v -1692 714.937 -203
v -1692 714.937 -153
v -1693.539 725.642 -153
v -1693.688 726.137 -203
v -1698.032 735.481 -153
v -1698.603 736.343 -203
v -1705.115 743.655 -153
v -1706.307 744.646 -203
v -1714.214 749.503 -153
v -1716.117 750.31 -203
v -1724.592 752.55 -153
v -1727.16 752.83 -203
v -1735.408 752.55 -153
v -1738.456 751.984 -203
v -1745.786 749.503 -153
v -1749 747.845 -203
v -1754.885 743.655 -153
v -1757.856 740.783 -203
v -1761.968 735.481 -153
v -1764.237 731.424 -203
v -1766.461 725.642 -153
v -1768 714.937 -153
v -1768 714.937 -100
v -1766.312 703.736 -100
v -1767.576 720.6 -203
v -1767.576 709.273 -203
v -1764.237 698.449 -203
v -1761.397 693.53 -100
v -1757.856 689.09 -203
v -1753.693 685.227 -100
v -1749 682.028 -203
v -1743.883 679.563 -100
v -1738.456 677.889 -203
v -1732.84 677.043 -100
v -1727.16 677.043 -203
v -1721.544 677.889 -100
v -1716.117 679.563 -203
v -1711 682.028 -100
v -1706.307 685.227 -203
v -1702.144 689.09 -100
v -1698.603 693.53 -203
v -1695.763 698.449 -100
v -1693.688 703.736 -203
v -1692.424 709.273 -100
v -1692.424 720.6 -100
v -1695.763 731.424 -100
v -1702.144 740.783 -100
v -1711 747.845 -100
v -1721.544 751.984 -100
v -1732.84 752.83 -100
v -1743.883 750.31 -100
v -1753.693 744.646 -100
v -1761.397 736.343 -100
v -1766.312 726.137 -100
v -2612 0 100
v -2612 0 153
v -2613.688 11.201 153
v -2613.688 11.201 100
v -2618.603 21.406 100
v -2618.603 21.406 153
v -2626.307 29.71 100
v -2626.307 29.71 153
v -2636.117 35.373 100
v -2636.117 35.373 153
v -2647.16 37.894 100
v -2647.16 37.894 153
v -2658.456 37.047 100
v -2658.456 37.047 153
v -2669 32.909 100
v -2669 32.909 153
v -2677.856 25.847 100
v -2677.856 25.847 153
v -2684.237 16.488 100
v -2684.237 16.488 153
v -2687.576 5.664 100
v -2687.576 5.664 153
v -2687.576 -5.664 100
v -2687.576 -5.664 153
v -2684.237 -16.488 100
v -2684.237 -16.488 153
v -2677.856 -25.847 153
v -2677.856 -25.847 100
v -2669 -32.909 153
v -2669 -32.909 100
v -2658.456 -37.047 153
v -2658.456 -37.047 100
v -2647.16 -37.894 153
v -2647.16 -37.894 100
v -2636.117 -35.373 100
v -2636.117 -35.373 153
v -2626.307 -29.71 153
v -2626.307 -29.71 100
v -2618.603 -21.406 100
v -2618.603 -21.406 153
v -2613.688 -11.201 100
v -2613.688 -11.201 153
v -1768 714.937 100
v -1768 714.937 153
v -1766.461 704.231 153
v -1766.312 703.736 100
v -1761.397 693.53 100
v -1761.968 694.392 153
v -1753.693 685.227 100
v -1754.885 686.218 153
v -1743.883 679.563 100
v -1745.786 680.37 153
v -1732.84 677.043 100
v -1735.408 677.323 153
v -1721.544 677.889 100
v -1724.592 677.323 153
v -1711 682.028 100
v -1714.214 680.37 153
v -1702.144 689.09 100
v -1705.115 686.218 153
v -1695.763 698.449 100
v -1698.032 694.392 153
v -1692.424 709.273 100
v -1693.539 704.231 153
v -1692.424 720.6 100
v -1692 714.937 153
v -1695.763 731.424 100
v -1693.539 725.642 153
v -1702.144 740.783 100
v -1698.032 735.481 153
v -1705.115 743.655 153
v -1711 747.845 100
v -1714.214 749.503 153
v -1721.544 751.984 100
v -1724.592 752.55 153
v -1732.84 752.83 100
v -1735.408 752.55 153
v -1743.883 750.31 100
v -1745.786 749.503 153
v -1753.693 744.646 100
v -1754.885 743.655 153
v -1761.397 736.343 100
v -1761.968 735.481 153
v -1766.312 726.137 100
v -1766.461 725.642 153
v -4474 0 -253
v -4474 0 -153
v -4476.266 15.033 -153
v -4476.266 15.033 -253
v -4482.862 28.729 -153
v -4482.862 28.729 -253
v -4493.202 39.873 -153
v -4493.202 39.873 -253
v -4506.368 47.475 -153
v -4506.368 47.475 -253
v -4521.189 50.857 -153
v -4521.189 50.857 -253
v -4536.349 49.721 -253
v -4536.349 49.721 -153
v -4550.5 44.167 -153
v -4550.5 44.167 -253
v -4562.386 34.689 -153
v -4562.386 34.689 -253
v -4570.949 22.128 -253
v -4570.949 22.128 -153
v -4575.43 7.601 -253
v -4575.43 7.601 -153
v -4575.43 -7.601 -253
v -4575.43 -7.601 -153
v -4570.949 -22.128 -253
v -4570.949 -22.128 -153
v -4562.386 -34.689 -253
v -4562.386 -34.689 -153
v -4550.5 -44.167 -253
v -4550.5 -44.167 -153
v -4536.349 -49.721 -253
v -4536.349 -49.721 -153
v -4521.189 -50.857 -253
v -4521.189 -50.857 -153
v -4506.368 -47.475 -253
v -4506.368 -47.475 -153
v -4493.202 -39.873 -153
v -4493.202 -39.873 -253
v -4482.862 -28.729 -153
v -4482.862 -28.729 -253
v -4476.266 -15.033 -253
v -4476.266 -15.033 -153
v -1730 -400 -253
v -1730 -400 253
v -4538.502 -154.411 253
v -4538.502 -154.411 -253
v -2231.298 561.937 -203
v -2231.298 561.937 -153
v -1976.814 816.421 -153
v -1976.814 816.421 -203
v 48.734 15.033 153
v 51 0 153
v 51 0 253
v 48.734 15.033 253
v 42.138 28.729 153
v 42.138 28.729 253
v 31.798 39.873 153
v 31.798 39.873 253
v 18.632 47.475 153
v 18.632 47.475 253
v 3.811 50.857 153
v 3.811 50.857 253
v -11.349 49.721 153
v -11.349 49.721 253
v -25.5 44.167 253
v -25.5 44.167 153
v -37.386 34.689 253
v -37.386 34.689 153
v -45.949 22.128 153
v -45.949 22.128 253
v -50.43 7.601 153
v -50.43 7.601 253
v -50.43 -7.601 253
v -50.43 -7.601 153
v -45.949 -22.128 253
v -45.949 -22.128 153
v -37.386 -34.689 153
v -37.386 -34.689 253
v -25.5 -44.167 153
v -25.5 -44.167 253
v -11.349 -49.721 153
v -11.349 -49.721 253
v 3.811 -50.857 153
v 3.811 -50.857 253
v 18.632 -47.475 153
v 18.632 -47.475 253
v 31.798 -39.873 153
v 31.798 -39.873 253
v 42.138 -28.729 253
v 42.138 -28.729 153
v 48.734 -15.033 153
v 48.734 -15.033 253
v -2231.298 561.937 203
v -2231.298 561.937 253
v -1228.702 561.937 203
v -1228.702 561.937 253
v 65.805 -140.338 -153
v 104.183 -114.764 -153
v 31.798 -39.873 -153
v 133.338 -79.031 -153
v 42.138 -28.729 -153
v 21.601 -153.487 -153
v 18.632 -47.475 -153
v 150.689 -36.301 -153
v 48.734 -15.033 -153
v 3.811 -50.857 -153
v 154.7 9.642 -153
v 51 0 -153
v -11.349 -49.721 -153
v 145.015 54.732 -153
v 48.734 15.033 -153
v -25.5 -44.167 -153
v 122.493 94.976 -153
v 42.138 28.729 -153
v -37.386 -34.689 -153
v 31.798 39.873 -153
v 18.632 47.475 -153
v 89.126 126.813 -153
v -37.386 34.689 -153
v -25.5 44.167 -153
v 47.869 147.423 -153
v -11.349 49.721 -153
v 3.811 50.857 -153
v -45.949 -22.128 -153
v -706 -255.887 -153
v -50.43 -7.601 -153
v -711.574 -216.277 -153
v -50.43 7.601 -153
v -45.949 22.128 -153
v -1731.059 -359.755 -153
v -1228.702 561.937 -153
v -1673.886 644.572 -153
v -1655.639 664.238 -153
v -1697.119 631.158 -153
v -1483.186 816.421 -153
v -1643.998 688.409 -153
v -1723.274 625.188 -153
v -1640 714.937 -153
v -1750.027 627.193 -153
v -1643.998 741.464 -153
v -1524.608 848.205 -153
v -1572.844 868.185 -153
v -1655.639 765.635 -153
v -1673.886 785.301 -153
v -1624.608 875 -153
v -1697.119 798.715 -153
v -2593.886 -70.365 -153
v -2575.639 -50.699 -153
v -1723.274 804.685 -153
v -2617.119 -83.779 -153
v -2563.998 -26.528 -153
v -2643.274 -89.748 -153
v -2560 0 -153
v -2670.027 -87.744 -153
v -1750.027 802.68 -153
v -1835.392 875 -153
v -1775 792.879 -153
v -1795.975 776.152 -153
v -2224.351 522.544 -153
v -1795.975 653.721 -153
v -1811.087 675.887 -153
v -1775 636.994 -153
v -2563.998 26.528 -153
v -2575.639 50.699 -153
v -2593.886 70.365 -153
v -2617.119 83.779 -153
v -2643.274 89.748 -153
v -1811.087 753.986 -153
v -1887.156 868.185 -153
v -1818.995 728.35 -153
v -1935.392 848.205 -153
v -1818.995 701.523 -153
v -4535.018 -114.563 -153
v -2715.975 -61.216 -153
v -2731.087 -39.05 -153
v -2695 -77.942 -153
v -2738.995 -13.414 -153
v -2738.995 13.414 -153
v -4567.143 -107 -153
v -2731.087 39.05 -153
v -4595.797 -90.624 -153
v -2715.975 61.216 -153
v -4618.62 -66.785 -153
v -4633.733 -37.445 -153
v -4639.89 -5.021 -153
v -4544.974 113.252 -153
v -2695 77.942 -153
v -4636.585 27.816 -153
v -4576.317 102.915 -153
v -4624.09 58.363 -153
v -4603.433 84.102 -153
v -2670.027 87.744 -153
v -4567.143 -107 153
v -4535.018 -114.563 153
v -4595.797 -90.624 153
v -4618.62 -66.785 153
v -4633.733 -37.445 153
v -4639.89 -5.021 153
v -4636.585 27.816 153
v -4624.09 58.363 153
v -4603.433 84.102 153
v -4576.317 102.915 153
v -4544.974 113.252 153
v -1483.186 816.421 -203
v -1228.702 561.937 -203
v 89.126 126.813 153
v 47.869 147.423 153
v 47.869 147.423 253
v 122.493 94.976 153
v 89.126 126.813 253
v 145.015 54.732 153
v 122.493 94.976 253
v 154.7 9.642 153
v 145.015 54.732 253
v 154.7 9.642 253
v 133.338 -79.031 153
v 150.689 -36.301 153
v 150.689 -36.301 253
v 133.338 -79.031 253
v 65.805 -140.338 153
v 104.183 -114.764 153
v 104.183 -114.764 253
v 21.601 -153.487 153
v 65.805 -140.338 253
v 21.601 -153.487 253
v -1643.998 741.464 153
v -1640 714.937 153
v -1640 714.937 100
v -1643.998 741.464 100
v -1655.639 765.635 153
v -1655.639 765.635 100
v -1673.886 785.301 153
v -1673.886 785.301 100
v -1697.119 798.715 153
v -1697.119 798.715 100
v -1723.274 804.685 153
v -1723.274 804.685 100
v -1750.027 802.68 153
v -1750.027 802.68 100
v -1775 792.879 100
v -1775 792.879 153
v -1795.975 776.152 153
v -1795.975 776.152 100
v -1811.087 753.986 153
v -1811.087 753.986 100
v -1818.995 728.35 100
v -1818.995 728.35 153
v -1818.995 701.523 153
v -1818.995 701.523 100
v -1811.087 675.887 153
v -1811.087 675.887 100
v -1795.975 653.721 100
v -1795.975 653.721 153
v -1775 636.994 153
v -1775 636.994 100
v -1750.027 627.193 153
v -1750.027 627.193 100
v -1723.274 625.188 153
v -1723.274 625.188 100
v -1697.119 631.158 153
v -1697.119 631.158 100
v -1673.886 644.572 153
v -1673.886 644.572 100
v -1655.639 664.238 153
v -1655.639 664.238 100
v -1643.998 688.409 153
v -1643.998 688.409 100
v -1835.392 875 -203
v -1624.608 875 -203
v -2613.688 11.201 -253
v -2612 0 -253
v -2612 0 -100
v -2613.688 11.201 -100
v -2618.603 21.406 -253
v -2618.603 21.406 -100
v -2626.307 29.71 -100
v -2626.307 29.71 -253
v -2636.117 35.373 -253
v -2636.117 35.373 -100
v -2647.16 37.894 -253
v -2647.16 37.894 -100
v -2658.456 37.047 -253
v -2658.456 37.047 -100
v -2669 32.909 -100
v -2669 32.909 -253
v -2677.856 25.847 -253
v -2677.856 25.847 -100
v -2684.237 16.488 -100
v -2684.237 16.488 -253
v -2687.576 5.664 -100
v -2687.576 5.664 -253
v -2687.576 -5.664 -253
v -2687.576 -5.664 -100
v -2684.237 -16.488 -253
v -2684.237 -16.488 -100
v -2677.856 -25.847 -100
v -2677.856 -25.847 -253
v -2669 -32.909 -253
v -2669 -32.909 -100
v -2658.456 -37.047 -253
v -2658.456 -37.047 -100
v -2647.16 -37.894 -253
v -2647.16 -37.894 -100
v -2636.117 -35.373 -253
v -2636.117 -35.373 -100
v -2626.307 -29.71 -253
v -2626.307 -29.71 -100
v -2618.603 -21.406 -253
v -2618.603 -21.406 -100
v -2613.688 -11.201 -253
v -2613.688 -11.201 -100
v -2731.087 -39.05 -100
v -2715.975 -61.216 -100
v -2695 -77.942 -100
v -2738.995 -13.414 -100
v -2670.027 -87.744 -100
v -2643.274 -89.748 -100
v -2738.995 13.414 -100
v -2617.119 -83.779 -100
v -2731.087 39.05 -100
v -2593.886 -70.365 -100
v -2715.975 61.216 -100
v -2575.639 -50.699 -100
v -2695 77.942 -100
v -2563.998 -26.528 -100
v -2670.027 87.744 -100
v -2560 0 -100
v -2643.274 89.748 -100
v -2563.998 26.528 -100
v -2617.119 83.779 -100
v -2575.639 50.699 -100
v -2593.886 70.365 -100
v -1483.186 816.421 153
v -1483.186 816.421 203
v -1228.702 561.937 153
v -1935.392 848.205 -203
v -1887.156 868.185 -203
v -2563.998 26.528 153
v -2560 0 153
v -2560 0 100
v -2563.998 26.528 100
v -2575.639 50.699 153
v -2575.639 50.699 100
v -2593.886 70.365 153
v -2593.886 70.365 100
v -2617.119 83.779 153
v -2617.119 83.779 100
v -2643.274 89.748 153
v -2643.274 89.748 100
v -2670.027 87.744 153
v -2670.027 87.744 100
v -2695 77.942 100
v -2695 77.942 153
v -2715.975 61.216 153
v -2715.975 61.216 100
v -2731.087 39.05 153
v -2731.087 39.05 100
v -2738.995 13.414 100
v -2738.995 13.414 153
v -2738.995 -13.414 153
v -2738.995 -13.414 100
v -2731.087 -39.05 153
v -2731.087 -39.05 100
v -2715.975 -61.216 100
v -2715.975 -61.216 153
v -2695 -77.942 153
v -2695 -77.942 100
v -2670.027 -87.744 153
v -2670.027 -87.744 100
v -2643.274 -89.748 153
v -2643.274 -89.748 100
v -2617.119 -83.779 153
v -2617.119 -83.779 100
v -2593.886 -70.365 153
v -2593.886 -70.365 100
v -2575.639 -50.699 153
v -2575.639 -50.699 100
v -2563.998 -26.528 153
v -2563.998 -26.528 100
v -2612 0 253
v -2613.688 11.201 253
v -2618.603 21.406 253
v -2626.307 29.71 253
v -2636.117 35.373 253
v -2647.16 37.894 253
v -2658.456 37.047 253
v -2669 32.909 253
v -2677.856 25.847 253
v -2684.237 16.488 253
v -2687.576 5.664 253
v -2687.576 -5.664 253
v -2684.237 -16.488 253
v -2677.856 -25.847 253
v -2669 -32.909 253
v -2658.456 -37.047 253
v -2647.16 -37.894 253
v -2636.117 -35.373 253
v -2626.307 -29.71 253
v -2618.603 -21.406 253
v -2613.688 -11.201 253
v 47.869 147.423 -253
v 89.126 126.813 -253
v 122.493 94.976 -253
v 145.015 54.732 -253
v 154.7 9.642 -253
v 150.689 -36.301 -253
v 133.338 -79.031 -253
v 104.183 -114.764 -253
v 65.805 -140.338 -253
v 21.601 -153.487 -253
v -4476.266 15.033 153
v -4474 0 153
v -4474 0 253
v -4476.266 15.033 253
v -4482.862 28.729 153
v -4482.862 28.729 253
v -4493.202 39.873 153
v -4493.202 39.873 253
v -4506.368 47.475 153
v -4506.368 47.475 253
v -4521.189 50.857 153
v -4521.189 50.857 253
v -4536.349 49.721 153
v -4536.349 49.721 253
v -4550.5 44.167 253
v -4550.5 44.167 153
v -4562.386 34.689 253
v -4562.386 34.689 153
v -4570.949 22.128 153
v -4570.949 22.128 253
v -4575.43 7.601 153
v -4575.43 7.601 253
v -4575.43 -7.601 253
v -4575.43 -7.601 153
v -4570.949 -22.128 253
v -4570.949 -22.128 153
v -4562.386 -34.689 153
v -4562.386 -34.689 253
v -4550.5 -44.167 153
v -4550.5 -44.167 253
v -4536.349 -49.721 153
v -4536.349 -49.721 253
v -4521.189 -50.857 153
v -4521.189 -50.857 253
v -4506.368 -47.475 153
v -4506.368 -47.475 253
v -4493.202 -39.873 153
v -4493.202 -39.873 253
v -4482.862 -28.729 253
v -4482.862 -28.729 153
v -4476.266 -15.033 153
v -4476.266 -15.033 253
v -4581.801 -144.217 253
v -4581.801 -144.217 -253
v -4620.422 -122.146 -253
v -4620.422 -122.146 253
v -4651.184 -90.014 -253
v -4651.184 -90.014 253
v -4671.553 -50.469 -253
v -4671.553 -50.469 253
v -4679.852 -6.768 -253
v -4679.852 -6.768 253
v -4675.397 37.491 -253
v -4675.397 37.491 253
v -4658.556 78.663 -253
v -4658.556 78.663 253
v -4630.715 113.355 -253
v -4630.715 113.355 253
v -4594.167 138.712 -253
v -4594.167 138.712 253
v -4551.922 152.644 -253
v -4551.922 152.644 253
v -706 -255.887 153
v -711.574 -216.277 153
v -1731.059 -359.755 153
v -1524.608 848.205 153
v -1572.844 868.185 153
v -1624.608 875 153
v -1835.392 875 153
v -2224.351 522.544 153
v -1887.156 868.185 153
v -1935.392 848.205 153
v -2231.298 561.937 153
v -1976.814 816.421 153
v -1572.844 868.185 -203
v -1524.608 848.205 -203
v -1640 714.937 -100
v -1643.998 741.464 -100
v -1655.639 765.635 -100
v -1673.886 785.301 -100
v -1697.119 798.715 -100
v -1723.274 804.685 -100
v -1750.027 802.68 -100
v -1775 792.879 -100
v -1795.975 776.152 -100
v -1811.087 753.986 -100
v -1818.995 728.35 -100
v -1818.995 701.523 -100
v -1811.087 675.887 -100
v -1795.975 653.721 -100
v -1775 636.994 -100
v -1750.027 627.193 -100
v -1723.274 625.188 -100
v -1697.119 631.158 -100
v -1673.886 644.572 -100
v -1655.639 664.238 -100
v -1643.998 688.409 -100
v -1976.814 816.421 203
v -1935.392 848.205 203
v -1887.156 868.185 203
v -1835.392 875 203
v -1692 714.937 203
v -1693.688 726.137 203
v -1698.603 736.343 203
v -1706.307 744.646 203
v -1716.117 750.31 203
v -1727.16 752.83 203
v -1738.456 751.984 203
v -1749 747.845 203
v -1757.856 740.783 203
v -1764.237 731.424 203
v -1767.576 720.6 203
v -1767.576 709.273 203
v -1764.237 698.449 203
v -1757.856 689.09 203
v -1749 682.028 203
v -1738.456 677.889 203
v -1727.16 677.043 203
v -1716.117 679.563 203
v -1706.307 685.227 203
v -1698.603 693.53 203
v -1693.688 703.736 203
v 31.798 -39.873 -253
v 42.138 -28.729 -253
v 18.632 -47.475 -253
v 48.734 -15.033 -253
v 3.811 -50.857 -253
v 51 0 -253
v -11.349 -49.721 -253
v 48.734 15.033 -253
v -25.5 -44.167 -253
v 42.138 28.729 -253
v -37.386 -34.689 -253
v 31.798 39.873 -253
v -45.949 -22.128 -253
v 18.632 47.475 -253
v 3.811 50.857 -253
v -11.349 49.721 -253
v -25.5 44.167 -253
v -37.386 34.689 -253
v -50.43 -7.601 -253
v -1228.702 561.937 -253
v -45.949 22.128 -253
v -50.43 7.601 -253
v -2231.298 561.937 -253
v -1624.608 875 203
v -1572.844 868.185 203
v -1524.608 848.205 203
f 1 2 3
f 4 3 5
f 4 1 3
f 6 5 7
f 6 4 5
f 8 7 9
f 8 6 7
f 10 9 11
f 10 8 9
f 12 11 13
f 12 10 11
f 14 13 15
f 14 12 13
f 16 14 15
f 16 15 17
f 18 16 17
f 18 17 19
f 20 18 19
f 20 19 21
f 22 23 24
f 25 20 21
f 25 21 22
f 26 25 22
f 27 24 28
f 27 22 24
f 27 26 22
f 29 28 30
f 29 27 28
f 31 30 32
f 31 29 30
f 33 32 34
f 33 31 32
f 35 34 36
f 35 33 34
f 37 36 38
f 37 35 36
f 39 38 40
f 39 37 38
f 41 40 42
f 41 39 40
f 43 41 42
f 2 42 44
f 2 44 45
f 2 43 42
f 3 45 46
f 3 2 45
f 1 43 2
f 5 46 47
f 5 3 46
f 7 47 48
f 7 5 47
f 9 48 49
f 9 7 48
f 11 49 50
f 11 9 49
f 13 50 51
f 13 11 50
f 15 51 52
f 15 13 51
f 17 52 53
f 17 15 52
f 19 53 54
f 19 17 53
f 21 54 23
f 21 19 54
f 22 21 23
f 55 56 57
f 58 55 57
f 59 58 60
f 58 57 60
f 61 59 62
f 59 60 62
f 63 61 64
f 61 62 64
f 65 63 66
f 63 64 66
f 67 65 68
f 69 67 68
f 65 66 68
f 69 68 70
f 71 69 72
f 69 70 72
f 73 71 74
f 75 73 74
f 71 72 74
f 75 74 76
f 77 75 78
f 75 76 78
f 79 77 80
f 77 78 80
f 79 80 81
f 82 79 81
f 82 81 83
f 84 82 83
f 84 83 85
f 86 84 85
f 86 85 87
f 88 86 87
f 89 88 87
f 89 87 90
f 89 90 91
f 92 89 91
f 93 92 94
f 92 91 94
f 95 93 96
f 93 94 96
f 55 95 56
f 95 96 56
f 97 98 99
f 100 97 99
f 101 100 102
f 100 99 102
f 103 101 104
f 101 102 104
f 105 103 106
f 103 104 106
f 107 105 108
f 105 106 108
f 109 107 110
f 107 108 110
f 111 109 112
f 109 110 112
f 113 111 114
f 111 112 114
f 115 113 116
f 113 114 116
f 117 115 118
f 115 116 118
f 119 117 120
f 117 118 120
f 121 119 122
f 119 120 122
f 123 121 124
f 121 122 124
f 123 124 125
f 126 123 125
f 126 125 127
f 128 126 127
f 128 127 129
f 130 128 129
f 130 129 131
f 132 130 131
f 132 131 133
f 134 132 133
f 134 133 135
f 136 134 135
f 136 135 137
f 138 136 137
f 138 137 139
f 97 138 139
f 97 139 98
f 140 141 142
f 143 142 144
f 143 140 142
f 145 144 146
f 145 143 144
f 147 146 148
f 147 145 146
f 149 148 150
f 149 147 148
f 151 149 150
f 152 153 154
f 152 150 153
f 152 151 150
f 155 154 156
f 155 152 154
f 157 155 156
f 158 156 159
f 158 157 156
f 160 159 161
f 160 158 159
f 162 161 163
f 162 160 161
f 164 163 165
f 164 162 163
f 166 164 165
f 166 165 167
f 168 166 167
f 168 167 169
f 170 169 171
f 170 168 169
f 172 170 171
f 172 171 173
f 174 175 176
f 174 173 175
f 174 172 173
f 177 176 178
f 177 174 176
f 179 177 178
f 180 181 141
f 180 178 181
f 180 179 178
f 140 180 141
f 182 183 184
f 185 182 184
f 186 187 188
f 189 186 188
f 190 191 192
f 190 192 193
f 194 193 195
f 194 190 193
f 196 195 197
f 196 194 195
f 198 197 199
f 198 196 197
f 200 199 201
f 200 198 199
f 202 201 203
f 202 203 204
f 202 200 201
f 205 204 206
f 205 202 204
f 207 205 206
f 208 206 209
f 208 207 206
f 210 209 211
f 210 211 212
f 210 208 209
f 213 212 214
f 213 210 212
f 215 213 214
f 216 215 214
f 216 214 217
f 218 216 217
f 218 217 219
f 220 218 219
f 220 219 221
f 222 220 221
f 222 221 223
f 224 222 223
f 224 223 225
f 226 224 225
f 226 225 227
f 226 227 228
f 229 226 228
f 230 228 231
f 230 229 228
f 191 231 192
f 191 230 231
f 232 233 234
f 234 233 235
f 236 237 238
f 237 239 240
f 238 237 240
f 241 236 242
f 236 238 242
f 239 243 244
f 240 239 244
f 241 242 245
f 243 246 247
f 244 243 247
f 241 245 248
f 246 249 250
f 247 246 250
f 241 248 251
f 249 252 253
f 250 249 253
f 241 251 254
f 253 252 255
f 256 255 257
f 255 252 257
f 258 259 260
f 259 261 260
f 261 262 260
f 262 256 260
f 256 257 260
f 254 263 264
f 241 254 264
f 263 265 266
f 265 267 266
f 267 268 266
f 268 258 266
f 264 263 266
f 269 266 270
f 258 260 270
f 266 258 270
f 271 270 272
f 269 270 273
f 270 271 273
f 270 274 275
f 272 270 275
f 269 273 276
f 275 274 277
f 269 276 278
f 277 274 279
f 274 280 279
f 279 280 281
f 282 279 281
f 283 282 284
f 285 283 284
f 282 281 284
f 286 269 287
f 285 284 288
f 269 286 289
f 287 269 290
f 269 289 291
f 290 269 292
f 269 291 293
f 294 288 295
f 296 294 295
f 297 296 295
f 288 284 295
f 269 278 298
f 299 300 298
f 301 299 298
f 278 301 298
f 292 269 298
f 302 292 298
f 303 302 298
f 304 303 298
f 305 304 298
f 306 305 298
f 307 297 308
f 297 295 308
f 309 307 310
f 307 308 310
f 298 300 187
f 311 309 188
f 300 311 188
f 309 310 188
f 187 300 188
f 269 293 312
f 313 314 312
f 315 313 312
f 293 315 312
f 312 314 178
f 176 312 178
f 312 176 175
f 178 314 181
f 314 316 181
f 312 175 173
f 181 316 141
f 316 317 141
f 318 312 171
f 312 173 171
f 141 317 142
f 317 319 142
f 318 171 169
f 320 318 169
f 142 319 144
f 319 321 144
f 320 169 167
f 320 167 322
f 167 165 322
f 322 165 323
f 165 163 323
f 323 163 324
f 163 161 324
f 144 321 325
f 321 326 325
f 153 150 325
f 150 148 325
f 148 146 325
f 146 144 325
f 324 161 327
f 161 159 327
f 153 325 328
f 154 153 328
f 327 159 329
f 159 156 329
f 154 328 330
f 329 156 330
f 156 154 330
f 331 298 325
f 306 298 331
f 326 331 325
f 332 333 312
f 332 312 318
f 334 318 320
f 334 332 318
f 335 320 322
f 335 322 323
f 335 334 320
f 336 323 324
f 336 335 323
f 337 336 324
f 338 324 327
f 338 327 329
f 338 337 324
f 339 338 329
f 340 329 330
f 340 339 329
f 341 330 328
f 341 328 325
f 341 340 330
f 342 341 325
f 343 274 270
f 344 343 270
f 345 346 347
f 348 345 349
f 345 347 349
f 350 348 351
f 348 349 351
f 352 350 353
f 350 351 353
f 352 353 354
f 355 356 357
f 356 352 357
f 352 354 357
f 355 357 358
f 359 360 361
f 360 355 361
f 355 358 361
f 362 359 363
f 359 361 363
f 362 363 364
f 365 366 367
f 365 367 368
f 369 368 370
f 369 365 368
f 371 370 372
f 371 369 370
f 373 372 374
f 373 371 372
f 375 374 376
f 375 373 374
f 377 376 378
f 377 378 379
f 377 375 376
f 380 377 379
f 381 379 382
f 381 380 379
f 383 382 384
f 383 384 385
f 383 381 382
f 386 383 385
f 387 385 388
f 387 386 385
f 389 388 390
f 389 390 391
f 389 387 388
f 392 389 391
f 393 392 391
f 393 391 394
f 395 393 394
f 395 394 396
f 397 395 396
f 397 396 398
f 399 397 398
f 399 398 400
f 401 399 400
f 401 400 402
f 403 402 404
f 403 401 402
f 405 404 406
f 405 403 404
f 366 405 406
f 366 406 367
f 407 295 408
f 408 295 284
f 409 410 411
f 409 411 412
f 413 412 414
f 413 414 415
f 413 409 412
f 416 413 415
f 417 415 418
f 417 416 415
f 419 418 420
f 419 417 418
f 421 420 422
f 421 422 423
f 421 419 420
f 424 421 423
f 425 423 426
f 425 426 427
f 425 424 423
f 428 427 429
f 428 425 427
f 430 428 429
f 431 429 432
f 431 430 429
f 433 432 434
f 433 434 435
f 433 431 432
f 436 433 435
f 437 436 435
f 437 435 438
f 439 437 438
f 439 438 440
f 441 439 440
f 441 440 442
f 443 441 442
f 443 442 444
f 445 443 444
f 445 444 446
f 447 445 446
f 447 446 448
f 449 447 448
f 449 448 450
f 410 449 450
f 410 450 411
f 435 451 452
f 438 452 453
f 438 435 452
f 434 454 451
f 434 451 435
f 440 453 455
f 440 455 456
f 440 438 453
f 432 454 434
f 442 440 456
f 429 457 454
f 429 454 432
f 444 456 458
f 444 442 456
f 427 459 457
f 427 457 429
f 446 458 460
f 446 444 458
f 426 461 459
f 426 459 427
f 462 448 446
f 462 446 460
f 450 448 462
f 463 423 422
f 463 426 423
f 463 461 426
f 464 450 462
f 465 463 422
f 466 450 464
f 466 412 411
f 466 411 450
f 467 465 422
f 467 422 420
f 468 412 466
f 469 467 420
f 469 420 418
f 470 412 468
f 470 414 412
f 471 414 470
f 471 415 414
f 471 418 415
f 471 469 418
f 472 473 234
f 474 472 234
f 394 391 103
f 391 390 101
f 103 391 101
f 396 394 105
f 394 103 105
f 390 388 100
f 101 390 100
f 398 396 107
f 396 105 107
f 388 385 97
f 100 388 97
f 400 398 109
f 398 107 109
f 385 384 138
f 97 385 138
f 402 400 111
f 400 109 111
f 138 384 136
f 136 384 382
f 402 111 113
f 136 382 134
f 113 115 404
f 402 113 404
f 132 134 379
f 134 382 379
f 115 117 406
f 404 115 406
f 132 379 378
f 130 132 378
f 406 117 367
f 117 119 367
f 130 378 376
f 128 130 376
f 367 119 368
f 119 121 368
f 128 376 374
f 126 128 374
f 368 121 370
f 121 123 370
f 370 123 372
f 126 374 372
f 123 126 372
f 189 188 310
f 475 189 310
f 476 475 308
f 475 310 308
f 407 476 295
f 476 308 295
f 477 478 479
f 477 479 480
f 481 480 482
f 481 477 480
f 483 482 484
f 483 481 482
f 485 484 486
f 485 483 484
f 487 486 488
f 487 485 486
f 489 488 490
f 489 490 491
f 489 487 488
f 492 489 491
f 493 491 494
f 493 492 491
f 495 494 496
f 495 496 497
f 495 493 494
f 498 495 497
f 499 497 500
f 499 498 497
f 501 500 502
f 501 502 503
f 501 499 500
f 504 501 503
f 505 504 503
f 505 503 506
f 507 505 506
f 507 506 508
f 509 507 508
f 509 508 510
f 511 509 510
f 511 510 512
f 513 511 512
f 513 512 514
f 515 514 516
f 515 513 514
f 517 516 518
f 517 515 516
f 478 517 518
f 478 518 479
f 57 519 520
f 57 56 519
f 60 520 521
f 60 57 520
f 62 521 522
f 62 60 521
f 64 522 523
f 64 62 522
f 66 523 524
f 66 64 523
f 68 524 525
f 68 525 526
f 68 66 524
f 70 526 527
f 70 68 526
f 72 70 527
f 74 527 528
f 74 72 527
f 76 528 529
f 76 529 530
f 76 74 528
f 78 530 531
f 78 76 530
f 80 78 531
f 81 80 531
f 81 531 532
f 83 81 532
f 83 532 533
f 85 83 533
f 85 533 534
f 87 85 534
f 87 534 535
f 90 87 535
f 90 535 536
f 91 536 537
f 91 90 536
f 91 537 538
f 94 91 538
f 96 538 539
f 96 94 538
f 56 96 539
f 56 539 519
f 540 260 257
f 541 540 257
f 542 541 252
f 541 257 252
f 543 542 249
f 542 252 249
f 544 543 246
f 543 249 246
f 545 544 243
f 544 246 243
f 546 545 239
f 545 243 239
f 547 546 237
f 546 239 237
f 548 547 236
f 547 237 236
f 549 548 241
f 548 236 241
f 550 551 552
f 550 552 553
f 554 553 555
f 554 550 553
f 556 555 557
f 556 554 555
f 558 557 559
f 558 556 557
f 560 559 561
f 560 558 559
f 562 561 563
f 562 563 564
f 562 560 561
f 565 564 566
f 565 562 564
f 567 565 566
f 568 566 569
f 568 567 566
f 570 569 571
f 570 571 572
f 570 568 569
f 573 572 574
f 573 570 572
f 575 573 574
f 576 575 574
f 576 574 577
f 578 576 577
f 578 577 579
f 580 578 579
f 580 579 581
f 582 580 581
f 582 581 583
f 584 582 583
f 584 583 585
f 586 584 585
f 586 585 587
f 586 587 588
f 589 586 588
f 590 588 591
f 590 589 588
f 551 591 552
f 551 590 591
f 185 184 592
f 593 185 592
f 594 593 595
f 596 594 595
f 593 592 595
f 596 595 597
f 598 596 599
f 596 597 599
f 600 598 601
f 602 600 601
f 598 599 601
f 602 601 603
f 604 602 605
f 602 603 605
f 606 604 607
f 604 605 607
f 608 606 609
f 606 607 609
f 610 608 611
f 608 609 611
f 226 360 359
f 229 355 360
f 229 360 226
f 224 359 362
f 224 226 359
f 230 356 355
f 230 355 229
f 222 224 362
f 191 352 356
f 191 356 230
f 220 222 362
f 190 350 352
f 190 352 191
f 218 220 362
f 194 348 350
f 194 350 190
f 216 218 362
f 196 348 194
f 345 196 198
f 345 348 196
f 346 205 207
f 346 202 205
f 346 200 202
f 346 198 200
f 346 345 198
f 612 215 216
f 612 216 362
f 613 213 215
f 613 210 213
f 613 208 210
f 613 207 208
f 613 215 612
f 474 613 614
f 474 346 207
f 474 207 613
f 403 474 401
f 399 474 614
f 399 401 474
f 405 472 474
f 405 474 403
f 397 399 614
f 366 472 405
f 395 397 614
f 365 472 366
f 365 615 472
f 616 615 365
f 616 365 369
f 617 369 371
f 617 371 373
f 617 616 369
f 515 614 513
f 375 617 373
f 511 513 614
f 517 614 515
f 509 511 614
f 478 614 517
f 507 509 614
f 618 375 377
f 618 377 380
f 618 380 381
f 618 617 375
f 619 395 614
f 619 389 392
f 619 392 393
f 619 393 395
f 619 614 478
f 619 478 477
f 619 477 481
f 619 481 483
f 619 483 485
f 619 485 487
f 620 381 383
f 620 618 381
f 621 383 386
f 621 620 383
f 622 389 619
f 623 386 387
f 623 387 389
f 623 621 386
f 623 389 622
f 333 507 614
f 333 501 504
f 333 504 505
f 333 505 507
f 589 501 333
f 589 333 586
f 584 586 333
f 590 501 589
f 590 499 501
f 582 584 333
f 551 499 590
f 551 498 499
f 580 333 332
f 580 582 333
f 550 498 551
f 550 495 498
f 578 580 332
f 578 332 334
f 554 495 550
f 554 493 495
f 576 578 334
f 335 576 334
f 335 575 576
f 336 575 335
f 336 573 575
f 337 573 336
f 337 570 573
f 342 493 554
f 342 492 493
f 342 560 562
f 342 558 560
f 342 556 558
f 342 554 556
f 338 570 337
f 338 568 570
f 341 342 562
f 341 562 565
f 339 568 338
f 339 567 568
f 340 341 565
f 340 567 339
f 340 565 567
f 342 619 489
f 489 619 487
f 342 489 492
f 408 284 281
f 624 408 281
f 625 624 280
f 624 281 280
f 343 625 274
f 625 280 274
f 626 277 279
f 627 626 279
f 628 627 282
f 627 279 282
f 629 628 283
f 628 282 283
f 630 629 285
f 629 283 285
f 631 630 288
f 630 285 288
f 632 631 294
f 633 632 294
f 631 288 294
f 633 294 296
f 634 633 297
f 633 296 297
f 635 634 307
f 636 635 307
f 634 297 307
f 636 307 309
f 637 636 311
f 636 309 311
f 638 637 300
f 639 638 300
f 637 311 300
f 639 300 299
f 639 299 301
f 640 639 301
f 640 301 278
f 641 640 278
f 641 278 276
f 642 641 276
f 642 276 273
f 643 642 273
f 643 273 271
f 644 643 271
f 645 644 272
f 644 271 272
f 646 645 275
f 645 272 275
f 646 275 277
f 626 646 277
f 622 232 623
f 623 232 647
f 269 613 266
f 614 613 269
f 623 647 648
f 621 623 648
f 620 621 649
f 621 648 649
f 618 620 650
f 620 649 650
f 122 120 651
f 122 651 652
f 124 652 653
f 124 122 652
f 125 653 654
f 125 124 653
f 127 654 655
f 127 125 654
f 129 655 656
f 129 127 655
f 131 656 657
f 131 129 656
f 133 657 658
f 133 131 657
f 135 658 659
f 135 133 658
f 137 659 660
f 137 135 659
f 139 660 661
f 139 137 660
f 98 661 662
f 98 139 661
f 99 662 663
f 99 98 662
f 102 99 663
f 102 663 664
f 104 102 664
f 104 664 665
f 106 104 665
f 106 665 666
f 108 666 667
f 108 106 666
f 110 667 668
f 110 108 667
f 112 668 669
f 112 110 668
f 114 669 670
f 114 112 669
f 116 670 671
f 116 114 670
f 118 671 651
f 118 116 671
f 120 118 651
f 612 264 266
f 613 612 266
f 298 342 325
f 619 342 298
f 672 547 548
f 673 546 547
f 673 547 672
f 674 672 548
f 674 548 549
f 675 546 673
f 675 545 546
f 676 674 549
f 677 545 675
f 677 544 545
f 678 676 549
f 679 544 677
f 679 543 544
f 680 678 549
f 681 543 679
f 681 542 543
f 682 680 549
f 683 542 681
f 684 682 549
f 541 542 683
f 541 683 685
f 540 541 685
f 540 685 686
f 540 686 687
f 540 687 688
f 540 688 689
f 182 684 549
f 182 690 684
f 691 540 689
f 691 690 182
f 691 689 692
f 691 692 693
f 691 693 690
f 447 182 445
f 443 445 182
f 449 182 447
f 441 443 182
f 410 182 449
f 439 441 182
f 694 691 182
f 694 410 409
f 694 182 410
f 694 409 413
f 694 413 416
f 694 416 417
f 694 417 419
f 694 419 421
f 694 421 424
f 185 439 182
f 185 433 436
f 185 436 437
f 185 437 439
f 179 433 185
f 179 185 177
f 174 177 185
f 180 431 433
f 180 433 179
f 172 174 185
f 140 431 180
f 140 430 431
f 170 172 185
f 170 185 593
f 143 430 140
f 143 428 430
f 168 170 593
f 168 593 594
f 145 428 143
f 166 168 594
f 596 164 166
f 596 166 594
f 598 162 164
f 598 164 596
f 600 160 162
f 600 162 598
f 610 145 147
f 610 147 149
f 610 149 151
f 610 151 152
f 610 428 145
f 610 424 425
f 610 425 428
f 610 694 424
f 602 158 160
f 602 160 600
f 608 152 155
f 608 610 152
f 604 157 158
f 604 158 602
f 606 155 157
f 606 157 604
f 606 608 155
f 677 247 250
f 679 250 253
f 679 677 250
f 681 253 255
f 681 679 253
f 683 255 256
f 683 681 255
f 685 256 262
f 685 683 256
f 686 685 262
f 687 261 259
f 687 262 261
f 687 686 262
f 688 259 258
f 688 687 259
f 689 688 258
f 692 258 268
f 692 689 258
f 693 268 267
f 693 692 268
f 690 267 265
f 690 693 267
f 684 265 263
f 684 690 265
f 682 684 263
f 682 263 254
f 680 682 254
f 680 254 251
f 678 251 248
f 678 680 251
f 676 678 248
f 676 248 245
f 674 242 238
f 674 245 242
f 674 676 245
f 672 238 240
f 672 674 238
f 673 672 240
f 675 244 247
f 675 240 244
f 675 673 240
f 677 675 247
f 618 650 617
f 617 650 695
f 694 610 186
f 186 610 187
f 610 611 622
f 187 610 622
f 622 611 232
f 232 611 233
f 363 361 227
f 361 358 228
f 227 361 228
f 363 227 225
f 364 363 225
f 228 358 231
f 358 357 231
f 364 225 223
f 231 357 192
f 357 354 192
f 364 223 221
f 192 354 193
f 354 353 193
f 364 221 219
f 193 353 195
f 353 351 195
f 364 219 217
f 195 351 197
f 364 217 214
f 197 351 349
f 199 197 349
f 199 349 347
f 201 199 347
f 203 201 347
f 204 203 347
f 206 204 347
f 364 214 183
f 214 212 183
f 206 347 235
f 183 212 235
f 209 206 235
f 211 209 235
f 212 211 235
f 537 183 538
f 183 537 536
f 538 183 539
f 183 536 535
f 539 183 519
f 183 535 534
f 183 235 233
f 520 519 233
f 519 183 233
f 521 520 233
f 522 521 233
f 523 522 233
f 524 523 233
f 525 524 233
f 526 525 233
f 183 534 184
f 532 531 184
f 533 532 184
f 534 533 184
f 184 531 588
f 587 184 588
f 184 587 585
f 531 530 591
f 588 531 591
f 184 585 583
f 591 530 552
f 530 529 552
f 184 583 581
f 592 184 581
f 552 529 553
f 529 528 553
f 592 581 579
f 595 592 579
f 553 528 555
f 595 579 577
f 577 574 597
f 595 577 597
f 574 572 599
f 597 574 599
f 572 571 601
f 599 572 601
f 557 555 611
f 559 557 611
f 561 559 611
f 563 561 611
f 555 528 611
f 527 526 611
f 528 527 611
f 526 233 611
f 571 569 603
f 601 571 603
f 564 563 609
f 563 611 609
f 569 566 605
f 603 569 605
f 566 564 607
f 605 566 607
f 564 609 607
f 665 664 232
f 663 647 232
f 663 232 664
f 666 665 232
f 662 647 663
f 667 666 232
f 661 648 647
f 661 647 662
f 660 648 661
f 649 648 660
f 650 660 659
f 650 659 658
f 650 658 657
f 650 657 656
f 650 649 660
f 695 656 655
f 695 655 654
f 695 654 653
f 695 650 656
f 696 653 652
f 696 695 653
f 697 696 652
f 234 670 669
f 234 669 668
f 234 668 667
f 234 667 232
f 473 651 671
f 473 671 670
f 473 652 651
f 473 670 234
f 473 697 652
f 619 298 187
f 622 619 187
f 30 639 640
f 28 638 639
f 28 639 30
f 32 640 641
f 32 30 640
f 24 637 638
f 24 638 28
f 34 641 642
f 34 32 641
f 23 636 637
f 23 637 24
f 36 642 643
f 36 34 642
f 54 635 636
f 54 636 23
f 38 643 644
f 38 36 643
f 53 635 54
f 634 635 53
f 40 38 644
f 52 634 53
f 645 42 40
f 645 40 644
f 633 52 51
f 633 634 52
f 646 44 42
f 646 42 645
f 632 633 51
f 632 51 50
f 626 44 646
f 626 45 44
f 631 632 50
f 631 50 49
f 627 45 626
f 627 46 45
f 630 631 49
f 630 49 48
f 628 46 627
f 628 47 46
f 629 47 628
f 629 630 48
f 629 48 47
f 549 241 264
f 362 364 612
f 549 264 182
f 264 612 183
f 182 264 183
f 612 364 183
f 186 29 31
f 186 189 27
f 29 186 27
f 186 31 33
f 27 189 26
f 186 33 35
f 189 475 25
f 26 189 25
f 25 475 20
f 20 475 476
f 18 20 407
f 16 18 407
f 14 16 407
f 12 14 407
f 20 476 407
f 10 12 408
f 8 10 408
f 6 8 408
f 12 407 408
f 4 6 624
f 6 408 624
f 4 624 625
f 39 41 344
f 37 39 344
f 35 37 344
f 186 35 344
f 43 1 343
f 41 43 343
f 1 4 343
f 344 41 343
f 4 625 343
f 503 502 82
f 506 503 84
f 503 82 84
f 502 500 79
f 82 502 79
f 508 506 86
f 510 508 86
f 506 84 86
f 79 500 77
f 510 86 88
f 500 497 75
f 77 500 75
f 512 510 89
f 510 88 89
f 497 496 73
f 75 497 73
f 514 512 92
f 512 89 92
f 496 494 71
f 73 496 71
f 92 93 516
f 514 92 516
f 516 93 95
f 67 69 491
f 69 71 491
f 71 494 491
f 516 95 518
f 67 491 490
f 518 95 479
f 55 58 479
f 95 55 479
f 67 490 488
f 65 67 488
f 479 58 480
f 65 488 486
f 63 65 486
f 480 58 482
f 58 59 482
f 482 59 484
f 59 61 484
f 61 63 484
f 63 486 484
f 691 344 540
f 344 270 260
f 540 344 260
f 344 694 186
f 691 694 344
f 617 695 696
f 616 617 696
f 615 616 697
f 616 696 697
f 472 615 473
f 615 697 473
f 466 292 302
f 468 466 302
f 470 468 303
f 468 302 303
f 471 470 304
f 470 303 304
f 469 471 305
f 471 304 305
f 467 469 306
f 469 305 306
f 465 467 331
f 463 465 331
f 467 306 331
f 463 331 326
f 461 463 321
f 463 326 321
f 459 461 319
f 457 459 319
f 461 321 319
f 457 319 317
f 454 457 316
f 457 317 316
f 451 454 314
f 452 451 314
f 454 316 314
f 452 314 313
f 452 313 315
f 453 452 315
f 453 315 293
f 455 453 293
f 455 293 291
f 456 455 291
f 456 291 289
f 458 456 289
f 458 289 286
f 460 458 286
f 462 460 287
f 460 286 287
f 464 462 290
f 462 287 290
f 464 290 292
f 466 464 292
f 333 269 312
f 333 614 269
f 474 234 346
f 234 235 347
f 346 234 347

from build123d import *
from build123d.topology import SkipClean

# Parameters (mm, degrees)
SKETCH1_R           = 51
SKETCH1_R_2         = 38
BOSS_EXTRUDE2_DEPTH = 253
CUT_EXTRUDE1_DEPTH  = 153
SKETCH3_W           = 1002.596871638
SKETCH3_H           = 474.869981991
CUT_EXTRUDE3_DEPTH  = 50
SKETCH4_R           = 90
SKETCH4_R_2         = 38
BOSS_EXTRUDE3_DEPTH = 53


with BuildPart() as part:
    # Sketch1 → Boss-Extrude2 (new, symmetric)
    with BuildSketch(Plane.XY):
        with BuildLine():
            Line((-4551.922095967, 152.644032798), (-2231.298435819, 561.936500623))
            Line((-2231.298435819, 561.936500623), (-1976.813580205, 816.421356237))
            ThreePointArc((-1976.813580205, 816.421356237), (-1911.92891044, 859.775906502), (-1835.392223967, 875))
            Line((-1835.392223967, 875), (-1624.607776033, 875))
            ThreePointArc((-1624.607776033, 875), (-1548.07108956, 859.775906502), (-1483.186419795, 816.421356237))
            Line((-1483.186419795, 816.421356237), (-1228.701564181, 561.936500623))
            Line((-1228.701564181, 561.936500623), (47.869484486, 147.422903428))
            ThreePointArc((47.869484486, 147.422903428), (154.41275497, -13.479655139), (21.601139584, -153.487428699))
            Line((21.601139584, -153.487428699), (-1730, -400))
            Line((-1730, -400), (-4538.502435017, -154.410764679))
            ThreePointArc((-4538.502435017, -154.410764679), (-4679.85218061, -6.767729338), (-4551.922095967, 152.644032798))
        make_face()
        Circle(SKETCH1_R, mode=Mode.SUBTRACT)
        with Locations((-2650, 0)):
            Circle(SKETCH1_R_2, mode=Mode.SUBTRACT)
        with Locations((-4525, 0)):
            Circle(SKETCH1_R, mode=Mode.SUBTRACT)
        with Locations((-1730, 714.936500623)):
            Circle(SKETCH1_R_2, mode=Mode.SUBTRACT)
    extrude(amount=BOSS_EXTRUDE2_DEPTH, both=True)

    # Sketch2 → Cut-Extrude1 (cut, symmetric)
    with BuildSketch(Plane.XY):
        with BuildLine():
            Line((-2224.35079815, 522.544492159), (-2231.298435819, 561.936500623))
            Line((-2231.298435819, 561.936500623), (-2231.298435819, 1101.816027208))
            Line((-2231.298435819, 1101.816027208), (280.40791441, 1101.816027208))
            Line((280.40791441, 1101.816027208), (280.40791441, -255.886784207))
            Line((280.40791441, -255.886784207), (-706, -255.886784207))
            Line((-706, -255.886784207), (-711.574487634, -216.277125188))
            Line((-711.574487634, -216.277125188), (-1731.058577343, -359.754791807))
            Line((-1731.058577343, -359.754791807), (-4535.017935657, -114.562825407))
            ThreePointArc((-4535.017935657, -114.562825407), (-4639.890327549, -5.021218541), (-4544.974458298, 113.252024334))
            Line((-4544.974458298, 113.252024334), (-2224.35079815, 522.544492159))
        make_face()
    extrude(amount=CUT_EXTRUDE1_DEPTH, both=True, mode=Mode.SUBTRACT)

    # Sketch3 → Cut-Extrude3 (cut)
    with BuildSketch(Plane.XY.offset(253)):
        with Locations((-1730, 799.371491619)):
            Rectangle(SKETCH3_W, SKETCH3_H)
    cut_extrude3 = extrude(amount=-CUT_EXTRUDE3_DEPTH, mode=Mode.SUBTRACT)

    # Mirror2: Cut-Extrude3 across plane
    add(cut_extrude3.mirror(Plane.XY), mode=Mode.SUBTRACT)

    # Sketch4 → Boss-Extrude3 (add)
    # profile 1 of 2: a face of its own
    with BuildSketch(Plane.XY.offset(-153)):
        with Locations((-1730, 714.936500623)):
            Circle(SKETCH4_R)
        with Locations(Location((-1730, 714.936500623, 0), (0, 0, 180))):
            Circle(SKETCH4_R_2, mode=Mode.SUBTRACT)
    # profile 2 of 2: a face of its own
    with BuildSketch(Plane.XY.offset(-153)):
        with Locations((-2650, 0)):
            Circle(SKETCH4_R)
        with Locations((-2650, 0)):
            Circle(SKETCH4_R_2, mode=Mode.SUBTRACT)
    boss_extrude3 = extrude(amount=BOSS_EXTRUDE3_DEPTH)

    # Mirror3: Boss-Extrude3 across plane
    with SkipClean():  # the faces are left unmerged after this step: merging them gives an invalid solid
        add(boss_extrude3.mirror(Plane.XY))


solid = part.part
